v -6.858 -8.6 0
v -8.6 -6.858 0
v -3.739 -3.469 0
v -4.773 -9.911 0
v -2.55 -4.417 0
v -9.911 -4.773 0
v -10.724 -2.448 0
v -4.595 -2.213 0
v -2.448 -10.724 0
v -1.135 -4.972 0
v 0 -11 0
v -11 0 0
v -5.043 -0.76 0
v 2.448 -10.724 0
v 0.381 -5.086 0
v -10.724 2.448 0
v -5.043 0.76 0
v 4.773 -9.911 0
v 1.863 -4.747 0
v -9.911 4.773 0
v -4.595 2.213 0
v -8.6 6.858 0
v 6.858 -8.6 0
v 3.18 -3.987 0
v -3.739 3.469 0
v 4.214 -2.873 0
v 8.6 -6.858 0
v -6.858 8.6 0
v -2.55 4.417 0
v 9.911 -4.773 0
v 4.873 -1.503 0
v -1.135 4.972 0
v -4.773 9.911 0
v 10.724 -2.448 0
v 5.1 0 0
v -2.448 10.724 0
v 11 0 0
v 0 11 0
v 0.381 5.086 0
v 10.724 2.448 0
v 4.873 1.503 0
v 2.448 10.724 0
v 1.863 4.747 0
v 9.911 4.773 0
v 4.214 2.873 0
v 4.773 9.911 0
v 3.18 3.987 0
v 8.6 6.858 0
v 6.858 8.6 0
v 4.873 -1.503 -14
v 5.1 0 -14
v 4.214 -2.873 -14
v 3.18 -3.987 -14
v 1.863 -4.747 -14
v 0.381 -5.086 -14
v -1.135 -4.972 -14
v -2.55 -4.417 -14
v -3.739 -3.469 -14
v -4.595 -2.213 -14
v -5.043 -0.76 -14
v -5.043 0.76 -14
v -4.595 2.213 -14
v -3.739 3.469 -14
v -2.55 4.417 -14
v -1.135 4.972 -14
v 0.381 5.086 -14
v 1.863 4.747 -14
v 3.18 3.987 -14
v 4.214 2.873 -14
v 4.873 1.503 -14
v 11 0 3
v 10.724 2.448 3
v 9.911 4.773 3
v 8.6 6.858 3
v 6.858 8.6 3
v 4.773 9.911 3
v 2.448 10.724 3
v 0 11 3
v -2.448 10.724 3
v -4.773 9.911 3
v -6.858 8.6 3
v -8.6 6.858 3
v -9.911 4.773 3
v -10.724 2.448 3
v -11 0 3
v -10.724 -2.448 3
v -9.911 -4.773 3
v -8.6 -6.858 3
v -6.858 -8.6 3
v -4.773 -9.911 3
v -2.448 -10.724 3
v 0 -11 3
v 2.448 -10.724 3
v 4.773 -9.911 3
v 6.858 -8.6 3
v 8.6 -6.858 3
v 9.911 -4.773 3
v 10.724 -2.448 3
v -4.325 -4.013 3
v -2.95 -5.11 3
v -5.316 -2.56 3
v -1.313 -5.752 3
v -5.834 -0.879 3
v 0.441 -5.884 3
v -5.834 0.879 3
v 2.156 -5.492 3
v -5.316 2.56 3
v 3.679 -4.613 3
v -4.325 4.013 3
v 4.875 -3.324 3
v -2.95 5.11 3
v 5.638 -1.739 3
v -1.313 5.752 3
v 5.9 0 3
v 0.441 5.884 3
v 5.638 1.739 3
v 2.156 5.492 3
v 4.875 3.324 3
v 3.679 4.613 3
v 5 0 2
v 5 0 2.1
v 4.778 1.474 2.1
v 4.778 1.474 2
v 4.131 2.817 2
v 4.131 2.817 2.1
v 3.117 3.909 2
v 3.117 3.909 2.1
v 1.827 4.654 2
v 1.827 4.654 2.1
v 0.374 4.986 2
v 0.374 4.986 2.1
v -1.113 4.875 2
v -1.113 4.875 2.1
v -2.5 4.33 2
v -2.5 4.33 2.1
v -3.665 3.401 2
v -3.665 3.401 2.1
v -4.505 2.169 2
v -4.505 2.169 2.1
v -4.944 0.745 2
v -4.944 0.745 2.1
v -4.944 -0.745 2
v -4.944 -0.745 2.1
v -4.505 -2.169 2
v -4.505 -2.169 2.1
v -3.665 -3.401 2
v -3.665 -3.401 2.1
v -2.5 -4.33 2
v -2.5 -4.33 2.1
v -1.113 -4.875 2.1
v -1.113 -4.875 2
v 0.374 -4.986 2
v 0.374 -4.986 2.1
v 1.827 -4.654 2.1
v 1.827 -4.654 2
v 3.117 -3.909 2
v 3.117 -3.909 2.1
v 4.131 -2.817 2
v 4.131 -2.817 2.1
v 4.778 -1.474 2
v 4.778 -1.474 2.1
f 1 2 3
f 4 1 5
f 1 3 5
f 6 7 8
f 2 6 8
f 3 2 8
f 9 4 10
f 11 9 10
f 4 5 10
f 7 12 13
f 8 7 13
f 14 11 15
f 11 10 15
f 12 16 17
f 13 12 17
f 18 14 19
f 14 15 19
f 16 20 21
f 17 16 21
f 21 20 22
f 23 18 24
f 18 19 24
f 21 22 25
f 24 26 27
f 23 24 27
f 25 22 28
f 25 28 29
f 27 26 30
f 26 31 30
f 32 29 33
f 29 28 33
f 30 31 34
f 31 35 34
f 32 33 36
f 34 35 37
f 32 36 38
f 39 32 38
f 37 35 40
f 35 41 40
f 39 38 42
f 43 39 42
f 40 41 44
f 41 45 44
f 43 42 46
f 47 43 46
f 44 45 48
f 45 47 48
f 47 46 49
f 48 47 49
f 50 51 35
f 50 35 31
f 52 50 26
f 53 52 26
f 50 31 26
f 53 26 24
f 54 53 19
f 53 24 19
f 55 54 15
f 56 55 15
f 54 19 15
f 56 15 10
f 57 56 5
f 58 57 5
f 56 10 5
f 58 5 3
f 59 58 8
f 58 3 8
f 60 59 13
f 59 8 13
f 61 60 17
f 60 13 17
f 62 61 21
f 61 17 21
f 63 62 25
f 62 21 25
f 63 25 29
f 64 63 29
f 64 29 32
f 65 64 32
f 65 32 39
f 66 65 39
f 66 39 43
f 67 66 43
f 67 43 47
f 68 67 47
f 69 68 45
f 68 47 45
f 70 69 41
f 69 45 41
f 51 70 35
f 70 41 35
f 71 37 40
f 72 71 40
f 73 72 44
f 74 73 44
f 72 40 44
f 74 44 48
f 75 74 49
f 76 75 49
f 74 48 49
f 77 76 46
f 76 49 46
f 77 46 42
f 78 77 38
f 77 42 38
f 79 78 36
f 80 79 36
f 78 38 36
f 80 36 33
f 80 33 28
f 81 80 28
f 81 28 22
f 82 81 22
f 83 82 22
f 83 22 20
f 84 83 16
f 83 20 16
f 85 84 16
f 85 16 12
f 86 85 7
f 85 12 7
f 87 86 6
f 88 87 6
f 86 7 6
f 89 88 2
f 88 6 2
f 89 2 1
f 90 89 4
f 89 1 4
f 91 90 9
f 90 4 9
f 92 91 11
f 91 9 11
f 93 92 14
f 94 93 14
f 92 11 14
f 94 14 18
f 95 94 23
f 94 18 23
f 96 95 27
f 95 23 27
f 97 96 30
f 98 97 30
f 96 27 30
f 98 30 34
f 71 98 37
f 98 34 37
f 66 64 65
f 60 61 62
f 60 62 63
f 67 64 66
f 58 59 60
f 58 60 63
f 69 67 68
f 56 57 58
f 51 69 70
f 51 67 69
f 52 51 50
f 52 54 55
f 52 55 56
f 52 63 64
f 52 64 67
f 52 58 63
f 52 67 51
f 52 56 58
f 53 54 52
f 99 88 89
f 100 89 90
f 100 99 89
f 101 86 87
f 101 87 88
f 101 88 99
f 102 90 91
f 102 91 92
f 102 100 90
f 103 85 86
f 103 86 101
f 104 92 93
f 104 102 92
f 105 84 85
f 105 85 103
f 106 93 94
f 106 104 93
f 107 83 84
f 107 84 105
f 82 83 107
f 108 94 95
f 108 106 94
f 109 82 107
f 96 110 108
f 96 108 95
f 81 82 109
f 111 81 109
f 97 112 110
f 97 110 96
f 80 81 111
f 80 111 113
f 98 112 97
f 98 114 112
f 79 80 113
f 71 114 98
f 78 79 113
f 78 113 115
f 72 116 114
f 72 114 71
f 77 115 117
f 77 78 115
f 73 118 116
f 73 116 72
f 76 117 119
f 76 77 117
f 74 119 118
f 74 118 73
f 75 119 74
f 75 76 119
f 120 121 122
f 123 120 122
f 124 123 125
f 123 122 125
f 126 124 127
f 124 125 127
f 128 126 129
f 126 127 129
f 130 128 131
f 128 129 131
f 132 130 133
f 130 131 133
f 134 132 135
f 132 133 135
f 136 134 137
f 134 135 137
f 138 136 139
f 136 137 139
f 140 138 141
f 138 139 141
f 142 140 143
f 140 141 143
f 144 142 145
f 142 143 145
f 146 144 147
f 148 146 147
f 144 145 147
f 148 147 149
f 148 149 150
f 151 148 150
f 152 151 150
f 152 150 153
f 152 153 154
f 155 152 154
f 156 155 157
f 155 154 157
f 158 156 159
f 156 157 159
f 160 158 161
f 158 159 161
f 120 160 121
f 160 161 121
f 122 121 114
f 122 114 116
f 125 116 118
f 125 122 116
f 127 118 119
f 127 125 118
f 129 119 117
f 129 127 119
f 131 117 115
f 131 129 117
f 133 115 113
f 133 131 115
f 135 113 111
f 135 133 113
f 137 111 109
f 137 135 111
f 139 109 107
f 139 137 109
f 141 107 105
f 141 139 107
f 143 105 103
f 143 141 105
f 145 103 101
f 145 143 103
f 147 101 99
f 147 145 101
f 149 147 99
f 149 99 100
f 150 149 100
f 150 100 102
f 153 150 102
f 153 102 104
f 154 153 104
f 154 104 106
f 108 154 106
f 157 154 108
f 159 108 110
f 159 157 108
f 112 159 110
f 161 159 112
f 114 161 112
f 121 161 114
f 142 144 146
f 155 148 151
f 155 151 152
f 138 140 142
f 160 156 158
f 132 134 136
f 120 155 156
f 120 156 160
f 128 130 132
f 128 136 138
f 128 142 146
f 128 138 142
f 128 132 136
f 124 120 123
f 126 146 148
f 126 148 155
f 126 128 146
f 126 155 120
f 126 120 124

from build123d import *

# Parameters (mm, degrees)
SKETCH_R     = 11
PAD_DEPTH    = 3
SKETCH001_R  = 5
POCKET_DEPTH = 1
SKETCH002_R  = 5.1
PAD001_DEPTH = 14
CHAMFER_SIZE = 0.9


with BuildPart() as part:
    # Sketch → Pad (new body)
    with BuildSketch(Plane.XY):
        Circle(SKETCH_R)
    extrude(amount=PAD_DEPTH)

    # Sketch001 (on Face3 of Pad) → Pocket (cut)
    with BuildSketch(Plane.XY.offset(3)):
        Circle(SKETCH001_R)
    extrude(amount=-POCKET_DEPTH, mode=Mode.SUBTRACT)

    # Sketch002 (on Face2 of Pocket) → Pad001 (join)
    with BuildSketch(Plane(origin=(0, 0, 0), x_dir=(1, 0, 0), z_dir=(0, 0, -1))):
        Circle(SKETCH002_R)
    extrude(amount=PAD001_DEPTH)

    # Chamfer
    chamfer_edges = [part.edges().sort_by_distance(p)[0] for p in [
        (-5, 0, 3),
    ]]
    chamfer(chamfer_edges, length=CHAMFER_SIZE)


solid = part.part
